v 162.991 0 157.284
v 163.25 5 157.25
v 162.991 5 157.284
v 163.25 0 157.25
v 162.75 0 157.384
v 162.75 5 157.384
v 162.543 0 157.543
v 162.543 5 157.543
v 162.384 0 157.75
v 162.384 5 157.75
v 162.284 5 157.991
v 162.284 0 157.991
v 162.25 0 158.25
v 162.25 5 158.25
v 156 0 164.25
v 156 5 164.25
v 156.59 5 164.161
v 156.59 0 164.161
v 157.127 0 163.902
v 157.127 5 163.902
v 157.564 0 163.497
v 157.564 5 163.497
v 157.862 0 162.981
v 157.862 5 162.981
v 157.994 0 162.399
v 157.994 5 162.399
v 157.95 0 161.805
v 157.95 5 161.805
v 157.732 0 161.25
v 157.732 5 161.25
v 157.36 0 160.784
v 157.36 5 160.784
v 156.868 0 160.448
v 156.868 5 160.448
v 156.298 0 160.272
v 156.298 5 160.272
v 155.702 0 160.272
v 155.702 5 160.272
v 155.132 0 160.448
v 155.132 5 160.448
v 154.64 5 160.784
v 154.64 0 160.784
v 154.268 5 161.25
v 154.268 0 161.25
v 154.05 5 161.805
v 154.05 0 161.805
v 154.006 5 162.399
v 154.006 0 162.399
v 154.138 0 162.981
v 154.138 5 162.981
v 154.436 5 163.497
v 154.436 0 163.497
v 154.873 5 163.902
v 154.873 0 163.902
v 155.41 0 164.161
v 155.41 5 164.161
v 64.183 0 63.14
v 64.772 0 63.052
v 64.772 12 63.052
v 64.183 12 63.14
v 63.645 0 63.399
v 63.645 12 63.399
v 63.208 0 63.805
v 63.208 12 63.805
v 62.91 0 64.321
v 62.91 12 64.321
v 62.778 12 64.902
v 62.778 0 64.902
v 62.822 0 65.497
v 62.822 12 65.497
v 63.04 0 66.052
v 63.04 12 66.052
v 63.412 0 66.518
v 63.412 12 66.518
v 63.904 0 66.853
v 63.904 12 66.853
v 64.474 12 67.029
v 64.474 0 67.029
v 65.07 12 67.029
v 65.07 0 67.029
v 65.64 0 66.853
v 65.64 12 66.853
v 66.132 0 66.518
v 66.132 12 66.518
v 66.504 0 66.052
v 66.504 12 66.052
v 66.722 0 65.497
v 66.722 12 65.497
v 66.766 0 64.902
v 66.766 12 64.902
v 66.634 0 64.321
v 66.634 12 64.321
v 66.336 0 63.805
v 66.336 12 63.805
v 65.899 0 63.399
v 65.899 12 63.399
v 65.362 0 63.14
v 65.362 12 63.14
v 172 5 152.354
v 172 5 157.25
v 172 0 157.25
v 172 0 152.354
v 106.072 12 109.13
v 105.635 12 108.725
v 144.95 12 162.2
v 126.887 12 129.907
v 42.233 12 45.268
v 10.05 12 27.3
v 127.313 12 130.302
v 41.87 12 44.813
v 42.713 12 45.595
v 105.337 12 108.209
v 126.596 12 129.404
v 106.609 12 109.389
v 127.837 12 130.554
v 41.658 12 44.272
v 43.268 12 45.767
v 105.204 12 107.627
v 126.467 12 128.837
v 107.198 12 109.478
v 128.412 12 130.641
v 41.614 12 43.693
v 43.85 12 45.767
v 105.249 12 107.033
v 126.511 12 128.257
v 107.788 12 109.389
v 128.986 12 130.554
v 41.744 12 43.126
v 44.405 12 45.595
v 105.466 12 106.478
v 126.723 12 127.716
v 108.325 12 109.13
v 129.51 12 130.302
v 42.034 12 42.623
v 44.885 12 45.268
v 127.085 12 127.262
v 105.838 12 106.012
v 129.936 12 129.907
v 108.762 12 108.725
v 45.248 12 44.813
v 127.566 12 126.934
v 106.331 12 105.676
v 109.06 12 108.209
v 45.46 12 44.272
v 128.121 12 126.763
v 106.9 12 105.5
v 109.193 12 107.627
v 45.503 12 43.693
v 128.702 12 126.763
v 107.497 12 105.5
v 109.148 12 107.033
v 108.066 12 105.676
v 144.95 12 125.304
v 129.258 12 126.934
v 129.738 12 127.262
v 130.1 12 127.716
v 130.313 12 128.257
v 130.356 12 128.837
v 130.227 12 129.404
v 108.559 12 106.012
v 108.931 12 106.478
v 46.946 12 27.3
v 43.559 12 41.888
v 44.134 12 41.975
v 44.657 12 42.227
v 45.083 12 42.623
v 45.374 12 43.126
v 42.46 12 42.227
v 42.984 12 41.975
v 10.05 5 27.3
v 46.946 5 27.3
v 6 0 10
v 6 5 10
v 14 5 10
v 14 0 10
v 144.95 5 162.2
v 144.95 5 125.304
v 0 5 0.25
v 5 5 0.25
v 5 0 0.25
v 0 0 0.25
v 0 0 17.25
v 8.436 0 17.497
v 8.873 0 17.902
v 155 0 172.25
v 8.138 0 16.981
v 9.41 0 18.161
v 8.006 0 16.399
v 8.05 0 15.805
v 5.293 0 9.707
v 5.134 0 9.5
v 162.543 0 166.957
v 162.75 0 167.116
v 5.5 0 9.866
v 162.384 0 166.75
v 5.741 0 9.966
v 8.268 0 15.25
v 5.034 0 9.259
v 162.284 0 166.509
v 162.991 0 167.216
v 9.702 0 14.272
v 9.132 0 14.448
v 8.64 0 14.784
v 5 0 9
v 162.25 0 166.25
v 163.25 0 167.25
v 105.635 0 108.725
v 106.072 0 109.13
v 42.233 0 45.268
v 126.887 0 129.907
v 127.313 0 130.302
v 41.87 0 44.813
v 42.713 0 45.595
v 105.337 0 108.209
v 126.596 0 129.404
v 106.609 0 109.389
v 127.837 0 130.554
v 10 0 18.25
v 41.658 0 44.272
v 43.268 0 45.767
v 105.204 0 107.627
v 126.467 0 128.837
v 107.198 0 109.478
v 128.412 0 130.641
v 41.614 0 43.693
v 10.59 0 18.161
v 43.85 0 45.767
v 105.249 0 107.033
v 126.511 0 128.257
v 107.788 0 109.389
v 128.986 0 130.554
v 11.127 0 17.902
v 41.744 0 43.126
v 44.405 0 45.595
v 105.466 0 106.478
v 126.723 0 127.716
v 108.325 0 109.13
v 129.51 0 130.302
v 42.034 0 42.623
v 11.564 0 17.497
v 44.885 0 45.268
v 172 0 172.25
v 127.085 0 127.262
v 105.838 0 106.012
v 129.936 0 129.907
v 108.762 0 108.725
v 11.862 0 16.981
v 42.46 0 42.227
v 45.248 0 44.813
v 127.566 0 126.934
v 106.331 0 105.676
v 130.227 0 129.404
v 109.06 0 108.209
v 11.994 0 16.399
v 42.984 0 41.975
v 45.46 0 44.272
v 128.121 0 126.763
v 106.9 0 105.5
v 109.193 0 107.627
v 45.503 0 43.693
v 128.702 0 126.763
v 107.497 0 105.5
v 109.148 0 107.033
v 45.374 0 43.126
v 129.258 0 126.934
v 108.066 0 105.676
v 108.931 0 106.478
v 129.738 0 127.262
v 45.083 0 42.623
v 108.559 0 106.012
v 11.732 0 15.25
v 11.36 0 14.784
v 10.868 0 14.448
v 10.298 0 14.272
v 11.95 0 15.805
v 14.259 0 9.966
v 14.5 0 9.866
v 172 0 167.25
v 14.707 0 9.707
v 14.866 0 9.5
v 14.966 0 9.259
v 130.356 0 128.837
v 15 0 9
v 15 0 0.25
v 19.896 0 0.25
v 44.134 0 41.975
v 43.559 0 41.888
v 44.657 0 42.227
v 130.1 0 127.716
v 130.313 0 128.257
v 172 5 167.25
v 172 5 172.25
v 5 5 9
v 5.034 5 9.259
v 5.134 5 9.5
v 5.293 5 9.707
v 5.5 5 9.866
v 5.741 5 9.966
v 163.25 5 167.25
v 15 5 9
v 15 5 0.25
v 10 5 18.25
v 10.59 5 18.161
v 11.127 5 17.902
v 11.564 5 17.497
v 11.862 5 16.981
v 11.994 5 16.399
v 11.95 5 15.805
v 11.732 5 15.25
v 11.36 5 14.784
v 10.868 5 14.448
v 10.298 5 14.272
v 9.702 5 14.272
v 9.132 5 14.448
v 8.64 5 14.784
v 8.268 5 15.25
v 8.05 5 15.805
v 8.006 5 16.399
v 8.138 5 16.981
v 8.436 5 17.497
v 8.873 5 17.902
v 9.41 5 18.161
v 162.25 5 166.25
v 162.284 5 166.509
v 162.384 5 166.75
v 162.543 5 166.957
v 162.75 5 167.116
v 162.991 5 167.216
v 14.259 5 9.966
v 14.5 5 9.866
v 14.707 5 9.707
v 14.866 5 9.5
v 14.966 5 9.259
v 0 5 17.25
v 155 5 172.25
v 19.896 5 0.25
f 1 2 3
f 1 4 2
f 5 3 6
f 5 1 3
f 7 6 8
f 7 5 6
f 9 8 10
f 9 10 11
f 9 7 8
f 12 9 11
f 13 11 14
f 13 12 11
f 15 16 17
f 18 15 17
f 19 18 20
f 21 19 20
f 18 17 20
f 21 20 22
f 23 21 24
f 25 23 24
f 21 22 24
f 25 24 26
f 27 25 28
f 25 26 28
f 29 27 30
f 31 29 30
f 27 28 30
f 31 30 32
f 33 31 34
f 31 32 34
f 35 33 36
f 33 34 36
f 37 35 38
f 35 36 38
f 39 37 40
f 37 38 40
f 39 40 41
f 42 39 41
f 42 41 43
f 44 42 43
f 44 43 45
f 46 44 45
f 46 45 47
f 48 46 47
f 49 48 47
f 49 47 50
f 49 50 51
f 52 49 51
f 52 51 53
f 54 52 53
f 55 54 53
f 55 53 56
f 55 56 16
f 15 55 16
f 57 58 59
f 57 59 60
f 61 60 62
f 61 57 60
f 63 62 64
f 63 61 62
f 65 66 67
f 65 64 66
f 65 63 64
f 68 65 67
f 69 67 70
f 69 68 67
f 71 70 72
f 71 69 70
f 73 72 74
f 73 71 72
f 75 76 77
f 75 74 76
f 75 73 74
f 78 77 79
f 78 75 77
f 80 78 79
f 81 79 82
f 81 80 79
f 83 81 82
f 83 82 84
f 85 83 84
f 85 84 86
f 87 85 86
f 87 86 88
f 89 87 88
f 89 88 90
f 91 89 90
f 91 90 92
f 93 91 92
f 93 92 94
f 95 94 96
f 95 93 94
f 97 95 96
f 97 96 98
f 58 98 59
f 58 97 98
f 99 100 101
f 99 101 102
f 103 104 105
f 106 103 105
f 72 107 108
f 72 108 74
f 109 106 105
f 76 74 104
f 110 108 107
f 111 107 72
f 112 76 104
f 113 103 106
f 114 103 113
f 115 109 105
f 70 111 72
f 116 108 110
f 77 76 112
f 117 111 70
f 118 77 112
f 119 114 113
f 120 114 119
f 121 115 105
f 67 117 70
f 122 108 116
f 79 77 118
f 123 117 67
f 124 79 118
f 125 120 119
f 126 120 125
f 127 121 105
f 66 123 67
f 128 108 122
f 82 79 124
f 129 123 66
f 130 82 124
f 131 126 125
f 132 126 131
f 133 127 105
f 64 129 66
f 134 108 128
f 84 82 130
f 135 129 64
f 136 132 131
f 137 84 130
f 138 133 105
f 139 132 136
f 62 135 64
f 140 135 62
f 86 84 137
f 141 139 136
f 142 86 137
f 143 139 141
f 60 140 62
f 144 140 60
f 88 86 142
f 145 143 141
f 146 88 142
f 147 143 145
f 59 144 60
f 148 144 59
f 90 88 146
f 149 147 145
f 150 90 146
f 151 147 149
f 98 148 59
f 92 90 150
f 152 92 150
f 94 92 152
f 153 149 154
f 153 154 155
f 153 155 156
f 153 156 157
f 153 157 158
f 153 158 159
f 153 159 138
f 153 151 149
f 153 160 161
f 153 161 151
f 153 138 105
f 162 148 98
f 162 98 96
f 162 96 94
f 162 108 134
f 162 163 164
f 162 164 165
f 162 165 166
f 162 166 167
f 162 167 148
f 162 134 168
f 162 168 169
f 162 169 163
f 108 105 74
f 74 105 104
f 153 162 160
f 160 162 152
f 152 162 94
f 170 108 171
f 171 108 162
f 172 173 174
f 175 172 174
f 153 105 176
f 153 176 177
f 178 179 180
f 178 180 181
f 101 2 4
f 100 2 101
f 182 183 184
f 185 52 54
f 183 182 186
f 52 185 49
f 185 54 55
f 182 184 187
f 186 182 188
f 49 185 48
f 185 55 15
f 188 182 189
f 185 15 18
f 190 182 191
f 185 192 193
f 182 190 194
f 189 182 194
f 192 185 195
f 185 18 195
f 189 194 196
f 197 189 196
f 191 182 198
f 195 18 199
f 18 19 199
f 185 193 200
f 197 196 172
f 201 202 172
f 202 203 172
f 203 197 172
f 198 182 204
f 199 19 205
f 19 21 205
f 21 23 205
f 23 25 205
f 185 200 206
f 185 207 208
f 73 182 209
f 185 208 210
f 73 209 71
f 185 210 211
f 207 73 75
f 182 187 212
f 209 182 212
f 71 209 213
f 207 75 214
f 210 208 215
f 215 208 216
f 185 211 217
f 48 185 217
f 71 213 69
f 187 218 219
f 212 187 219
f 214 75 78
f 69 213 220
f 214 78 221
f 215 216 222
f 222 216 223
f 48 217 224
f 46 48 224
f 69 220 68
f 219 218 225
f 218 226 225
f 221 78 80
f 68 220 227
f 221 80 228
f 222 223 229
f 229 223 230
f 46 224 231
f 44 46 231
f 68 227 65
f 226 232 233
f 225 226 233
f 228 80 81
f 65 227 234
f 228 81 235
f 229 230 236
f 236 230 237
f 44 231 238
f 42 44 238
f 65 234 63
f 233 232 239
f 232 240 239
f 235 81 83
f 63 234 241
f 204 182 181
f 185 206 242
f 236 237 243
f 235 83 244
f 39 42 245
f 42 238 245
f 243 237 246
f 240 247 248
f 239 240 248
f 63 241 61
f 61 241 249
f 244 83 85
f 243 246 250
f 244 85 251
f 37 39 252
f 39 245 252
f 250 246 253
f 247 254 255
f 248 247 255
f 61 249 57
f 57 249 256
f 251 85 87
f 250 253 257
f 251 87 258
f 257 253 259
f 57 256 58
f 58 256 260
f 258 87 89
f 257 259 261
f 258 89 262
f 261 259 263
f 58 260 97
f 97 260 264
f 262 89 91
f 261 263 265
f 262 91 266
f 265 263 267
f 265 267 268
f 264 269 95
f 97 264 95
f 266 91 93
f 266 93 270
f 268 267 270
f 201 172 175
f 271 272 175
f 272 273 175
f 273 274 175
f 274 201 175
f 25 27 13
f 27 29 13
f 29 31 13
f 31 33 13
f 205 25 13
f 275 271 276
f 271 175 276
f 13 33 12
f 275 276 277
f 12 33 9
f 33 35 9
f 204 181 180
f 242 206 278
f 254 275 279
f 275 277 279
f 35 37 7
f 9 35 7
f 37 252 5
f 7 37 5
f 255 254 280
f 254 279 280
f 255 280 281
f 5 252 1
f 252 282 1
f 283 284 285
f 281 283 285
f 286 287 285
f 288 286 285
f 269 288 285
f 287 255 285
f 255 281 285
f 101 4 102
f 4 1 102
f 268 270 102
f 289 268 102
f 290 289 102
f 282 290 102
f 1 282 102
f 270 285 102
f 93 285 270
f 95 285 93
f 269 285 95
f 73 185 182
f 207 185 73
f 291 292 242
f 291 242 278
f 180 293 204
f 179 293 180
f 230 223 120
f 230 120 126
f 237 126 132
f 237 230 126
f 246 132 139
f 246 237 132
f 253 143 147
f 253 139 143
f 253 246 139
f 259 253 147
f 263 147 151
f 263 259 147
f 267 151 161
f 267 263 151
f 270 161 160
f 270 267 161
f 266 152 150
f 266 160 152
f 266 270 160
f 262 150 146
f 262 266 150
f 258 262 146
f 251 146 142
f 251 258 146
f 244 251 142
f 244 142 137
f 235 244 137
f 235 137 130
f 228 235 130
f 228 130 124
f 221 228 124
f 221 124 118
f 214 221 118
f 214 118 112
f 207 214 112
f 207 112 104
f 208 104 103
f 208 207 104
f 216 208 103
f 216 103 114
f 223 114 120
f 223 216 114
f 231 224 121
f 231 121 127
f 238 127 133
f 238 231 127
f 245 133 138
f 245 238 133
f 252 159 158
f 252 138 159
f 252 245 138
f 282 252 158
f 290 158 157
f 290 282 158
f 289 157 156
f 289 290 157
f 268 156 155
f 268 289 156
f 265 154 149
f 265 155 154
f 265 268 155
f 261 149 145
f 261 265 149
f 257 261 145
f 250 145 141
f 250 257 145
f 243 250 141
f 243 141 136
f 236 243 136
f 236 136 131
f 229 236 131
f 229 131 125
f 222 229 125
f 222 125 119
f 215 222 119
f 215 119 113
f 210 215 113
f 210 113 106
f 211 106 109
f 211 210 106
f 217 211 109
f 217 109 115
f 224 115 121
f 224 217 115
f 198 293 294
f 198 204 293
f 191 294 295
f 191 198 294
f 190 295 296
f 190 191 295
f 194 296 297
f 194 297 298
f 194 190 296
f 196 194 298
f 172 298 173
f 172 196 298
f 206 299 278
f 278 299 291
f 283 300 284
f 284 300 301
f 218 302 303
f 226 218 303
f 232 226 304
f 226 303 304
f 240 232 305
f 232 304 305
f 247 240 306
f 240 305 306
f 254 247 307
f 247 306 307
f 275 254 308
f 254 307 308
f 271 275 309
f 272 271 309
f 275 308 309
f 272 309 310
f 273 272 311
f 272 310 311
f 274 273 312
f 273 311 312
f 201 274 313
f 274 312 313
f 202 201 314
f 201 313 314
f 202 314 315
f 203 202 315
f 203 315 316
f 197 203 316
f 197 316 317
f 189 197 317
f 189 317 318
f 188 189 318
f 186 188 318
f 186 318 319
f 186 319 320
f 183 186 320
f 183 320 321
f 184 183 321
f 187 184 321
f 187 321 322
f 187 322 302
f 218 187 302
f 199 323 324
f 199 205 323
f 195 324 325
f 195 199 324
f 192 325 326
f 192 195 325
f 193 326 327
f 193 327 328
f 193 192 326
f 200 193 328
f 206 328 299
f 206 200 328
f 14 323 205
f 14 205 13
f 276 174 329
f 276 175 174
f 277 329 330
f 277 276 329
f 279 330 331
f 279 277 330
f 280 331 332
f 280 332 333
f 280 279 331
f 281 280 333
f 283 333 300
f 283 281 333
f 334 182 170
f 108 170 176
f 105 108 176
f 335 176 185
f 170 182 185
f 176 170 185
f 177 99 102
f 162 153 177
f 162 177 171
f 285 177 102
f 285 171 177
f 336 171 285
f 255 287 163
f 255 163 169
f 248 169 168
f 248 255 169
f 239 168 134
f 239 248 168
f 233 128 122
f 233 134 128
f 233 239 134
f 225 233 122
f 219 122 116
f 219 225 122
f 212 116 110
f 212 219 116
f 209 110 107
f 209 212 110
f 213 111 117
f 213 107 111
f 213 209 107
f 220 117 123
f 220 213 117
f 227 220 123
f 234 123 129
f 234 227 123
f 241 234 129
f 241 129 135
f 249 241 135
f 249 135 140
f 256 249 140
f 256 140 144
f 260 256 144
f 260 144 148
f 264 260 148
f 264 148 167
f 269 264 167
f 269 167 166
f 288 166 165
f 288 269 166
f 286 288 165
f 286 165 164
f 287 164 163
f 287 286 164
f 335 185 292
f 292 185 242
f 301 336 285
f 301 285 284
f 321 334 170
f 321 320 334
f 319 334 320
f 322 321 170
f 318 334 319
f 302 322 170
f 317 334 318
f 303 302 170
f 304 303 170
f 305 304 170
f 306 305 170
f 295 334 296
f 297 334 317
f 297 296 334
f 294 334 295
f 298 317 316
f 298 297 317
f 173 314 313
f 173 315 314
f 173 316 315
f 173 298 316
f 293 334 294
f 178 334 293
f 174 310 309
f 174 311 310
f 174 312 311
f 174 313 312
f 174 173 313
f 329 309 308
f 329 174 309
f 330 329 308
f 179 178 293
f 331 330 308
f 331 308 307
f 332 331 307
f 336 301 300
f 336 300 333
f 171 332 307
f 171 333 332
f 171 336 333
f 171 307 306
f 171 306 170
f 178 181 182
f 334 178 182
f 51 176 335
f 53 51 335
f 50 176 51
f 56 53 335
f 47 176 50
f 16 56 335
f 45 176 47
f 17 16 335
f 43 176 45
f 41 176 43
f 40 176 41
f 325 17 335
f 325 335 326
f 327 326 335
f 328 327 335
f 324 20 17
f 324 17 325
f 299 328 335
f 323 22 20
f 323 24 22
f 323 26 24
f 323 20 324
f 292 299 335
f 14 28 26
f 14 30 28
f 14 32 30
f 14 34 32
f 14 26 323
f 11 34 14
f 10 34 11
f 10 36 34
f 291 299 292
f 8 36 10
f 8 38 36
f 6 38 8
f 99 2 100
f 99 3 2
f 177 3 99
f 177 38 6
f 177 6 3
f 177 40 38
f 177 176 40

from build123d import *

# Parameters (mm, degrees)
BOSS_EXTRUDE1_DEPTH      = 12
SKETCH2_R                = 2
CUT_EXTRUDE1_DEPTH       = 244.893675605
SKETCH3_W                = 47.3
SKETCH3_H                = 27.3
SKETCH3_W_2              = 27.3
SKETCH3_H_2              = 47.3
CUT_EXTRUDE2_DEPTH       = 7
CUT_EXTRUDE8_DEPTH       = 244.893675605
CUT_EXTRUDE8_DEPTH_BACK  = 244.893675605
SKETCH5_R                = 1.95
SKETCH5_R_2              = 2
CUT_EXTRUDE10_DEPTH      = 244.893675605
CUT_EXTRUDE10_DEPTH_BACK = 244.893675605
SKETCH9_W                = 10
SKETCH9_H                = 9.75
SKETCH9_W_2              = 9.75
SKETCH9_H_2              = 10
CUT_EXTRUDE11_DEPTH      = 244.522201247
FILLET1_R                = 1


# Read off the part's stored shape, not the designer's step: Boss-Extrude1
with BuildPart() as part:
    # Boss-Extrude1 outline → Boss-Extrude1 (new body)
    with BuildSketch(Plane(origin=(0, 0, 0), x_dir=(1, 0, 0), z_dir=(0, 1, 0))):
        Polygon((0, 0), (0, -17.25), (155, -172.25), (172.25, -172.25), (172.25, -152.25), (20, 0), align=None)
    extrude(amount=BOSS_EXTRUDE1_DEPTH)

    # Sketch2 → Cut-Extrude1 (cut, through all)
    with BuildSketch(Plane(origin=(0, 12, 0), x_dir=(1, 0, 0), z_dir=(0, 1, 0))):
        with Locations(Location((10, -16.25, 0), (0, 0, 270))):
            Circle(SKETCH2_R)
        with Locations(Location((156, -162.25, 0), (0, 0, 270))):
            Circle(SKETCH2_R)
    extrude(amount=-CUT_EXTRUDE1_DEPTH, mode=Mode.SUBTRACT)

    # Sketch3 → Cut-Extrude2 (cut)
    with BuildSketch(Plane(origin=(0, 12, 0), x_dir=(1, 0, 0), z_dir=(0, 1, 0))):
        with Locations((23.65, -13.65)):
            Rectangle(SKETCH3_W, SKETCH3_H)
        with Locations((158.6, -148.6)):
            Rectangle(SKETCH3_W_2, SKETCH3_H_2)
    extrude(amount=-CUT_EXTRUDE2_DEPTH, mode=Mode.SUBTRACT)

    # Sketch5 → Cut-Extrude8 (cut, two sides: drawn at the far end of the back side and taken through both)
    with BuildSketch(Plane(origin=(0, 0, 0), x_dir=(1, 0, 0), z_dir=(0, 1, 0)).offset(-CUT_EXTRUDE8_DEPTH_BACK)):
        with Locations(Location((128.411688245, -128.691125497, 0), (0, 0, 270))):
            Circle(SKETCH5_R)
        with Locations(Location((107.19848481, -107.477922061, 0), (0, 0, 270))):
            Circle(SKETCH5_R_2)
        with Locations(Location((43.558874503, -43.838311755, 0), (0, 0, 90))):
            Circle(SKETCH5_R)
        with Locations(Location((64.772077939, -65.05151519, 0), (0, 0, 90))):
            Circle(SKETCH5_R_2)
    extrude(amount=CUT_EXTRUDE8_DEPTH + CUT_EXTRUDE8_DEPTH_BACK, mode=Mode.SUBTRACT)

    # Sketch8 → Cut-Extrude10 (cut, two sides: drawn at the far end of the back side and taken through both)
    with BuildSketch(Plane.XZ.offset(-CUT_EXTRUDE10_DEPTH_BACK)):
        Polygon((0, 497.196572238), (0, 0), (0, -10), (182, -10), (182, 172.25), (172, 172.25), (172, 152.353553391), (19.896446609, 0.25), (0, 0.25), (-497.196572238, 0.25), (205.768720009, -703.068934535), (702.965292247, -206.122362298), align=None)
    extrude(amount=CUT_EXTRUDE10_DEPTH + CUT_EXTRUDE10_DEPTH_BACK, mode=Mode.SUBTRACT)

    # Sketch9 → Cut-Extrude11 (cut, through all)
    with BuildSketch(Plane(origin=(0, 5, 0), x_dir=(1, 0, 0), z_dir=(0, 1, 0))):
        with Locations((10, -5.125)):
            Rectangle(SKETCH9_W, SKETCH9_H)
        with Locations((167.125, -162.25)):
            Rectangle(SKETCH9_W_2, SKETCH9_H_2)
    extrude(amount=-CUT_EXTRUDE11_DEPTH, mode=Mode.SUBTRACT)

    # Fillet1
    fillet1_edges = [part.edges().sort_by_distance(p)[0] for p in [
        (5, 2.5, 10),
        (15, 2.5, 10),
        (162.25, 2.5, 167.25),
        (162.25, 2.5, 157.25),
    ]]
    fillet(fillet1_edges, radius=FILLET1_R)


solid = part.part
